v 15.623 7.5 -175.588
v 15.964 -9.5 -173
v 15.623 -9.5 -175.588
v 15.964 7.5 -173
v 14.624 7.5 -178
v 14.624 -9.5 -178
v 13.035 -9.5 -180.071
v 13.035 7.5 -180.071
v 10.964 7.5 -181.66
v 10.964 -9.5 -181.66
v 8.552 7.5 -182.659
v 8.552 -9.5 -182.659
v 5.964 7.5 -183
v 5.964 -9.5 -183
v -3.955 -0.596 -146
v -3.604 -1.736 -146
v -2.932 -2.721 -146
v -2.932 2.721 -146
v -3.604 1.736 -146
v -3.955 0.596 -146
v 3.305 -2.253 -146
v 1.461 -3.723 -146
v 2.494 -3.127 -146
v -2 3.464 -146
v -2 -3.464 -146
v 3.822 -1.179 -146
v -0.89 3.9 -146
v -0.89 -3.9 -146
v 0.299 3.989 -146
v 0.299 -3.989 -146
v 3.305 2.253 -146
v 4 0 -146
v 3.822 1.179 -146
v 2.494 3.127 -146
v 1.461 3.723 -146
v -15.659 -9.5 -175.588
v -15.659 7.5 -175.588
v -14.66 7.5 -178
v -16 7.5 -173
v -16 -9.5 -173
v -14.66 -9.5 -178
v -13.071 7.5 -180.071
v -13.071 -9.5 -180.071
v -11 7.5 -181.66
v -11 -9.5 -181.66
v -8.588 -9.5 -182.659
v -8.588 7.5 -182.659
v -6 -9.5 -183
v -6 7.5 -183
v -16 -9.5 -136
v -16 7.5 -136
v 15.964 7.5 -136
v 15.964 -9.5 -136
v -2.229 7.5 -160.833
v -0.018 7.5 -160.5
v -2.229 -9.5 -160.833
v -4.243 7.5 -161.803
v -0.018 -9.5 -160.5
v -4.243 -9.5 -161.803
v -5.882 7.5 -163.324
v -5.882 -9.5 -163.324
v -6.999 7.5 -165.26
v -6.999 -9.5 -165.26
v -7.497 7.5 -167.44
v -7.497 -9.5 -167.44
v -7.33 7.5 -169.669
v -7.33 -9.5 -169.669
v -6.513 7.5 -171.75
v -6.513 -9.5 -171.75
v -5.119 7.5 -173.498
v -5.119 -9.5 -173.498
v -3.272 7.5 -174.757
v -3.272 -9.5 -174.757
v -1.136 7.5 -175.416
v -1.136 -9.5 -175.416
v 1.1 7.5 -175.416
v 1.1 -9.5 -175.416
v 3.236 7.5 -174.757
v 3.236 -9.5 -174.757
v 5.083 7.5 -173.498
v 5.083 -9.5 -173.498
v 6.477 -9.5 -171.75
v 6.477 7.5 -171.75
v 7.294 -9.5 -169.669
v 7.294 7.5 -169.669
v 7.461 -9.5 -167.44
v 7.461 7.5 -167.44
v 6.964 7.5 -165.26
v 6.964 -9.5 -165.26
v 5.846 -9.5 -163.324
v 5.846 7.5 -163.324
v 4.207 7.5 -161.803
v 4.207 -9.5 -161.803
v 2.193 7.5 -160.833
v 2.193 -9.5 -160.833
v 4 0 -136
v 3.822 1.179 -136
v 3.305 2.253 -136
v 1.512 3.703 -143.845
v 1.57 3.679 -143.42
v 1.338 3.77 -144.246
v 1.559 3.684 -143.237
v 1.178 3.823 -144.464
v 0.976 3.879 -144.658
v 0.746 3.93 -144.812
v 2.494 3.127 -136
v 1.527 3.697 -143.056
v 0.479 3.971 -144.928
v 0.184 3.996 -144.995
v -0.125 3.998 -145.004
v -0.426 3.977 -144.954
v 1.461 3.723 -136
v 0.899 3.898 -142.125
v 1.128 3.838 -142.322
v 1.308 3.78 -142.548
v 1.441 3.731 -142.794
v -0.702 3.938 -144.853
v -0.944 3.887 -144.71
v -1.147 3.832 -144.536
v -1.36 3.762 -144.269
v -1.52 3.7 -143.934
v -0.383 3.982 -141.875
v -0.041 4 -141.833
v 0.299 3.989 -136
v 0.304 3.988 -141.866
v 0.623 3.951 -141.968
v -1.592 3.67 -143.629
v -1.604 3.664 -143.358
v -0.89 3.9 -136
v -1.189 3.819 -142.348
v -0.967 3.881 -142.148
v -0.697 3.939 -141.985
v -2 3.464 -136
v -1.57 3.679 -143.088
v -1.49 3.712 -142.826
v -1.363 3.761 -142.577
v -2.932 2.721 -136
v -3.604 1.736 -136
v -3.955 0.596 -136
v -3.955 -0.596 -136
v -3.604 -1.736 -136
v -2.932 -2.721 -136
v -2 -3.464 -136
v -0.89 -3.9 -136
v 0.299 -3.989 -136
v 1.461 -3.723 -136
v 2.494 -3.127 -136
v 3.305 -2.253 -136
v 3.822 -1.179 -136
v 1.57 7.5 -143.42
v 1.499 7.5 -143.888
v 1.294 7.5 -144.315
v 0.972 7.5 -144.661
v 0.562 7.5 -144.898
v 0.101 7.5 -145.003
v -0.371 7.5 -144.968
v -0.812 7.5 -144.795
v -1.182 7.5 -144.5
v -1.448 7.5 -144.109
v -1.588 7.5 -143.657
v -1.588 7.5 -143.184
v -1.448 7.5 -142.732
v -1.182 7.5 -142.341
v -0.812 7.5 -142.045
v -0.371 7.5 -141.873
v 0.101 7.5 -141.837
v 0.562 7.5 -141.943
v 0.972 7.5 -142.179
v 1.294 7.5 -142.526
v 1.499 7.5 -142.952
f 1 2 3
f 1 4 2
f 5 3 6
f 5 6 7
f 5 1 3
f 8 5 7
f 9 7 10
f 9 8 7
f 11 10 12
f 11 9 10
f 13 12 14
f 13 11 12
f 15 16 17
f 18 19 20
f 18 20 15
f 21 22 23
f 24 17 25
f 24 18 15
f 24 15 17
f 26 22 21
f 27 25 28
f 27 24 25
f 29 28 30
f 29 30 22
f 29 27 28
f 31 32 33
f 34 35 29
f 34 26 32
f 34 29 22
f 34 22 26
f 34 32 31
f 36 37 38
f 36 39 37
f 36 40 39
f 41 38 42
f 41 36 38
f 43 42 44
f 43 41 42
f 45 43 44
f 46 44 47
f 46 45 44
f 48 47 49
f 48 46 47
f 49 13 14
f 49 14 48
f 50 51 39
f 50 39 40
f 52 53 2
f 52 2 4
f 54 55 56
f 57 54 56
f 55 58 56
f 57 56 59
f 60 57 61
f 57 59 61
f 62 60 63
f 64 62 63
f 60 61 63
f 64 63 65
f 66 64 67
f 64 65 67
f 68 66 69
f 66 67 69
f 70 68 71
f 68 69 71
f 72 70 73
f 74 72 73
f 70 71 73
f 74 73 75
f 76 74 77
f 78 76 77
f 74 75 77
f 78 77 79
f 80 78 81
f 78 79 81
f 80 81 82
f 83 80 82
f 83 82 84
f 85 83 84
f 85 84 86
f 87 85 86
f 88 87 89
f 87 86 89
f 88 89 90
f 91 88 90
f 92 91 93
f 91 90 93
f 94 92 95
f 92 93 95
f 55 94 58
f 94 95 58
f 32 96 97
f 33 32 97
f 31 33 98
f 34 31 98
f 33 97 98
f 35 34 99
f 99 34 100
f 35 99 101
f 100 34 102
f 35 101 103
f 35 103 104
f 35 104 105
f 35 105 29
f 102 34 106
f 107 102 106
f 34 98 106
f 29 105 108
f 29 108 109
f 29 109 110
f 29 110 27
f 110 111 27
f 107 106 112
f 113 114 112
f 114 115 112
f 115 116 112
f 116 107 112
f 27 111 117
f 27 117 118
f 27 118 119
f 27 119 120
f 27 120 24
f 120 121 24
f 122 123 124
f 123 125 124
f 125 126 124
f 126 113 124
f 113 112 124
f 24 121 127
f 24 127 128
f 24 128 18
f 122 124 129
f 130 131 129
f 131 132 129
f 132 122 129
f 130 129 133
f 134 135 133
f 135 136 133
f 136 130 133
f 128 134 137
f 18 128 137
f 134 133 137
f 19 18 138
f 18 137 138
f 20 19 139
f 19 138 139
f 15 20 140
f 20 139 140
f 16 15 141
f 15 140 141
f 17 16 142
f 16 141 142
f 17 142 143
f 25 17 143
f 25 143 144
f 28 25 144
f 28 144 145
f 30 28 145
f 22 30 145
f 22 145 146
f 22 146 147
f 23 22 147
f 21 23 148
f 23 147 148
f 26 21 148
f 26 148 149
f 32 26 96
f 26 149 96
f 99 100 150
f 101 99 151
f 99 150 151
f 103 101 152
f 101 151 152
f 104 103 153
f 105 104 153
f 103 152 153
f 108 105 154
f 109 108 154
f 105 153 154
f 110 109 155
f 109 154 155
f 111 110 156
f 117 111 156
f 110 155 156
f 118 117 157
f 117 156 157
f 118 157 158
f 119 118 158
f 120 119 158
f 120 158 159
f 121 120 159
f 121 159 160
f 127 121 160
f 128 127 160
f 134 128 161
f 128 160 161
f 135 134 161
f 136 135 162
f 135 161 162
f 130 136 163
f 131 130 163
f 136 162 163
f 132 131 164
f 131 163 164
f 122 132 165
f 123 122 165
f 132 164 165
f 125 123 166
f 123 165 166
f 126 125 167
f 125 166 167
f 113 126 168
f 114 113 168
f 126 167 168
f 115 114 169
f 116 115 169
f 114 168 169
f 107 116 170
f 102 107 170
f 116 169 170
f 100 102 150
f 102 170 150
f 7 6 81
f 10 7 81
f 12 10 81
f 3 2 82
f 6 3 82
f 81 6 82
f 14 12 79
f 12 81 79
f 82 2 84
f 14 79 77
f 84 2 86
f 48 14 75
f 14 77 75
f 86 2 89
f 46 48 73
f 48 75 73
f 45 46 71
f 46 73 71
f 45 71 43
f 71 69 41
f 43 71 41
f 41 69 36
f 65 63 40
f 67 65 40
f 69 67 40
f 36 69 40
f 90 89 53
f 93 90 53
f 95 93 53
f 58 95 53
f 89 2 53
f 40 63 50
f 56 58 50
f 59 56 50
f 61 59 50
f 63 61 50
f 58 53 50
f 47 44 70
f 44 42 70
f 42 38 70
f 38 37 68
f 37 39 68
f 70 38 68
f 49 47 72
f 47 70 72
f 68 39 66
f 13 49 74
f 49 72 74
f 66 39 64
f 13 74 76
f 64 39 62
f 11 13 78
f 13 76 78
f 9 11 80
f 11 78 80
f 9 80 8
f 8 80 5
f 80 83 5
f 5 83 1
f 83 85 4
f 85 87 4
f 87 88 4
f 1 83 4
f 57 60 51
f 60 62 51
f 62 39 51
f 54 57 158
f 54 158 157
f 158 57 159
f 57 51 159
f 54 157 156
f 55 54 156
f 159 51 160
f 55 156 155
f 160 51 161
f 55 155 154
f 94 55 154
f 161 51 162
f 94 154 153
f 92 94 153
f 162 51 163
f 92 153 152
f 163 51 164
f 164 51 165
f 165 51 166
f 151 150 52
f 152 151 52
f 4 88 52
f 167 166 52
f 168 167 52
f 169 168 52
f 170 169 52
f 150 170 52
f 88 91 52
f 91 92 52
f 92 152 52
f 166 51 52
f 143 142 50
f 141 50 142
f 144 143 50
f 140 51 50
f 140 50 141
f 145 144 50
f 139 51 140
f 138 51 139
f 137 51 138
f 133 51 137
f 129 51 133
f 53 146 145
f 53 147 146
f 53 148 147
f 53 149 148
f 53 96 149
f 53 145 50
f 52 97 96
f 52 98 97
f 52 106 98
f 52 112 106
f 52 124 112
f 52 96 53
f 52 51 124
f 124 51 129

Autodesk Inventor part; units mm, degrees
ref_plane "YZ Plane" through (0, 0, 0) normal (1, 0, 0) x (0, 1, 0)
ref_plane "XZ Plane" through (0, 0, 0) normal (0, 1, 0) x (-1, 0, 0)
ref_plane "XY Plane" through (0, 0, 0) normal (0, 0, 1) x (1, 0, 0)
sketch "Sketch1" plane through (0, 0, 0) normal (0, 0, 1) x (1, 0, 0)
  circle A0 centre (0, 0) radius 7.5
  line L0 (-16, 7.5) -> (16, 7.5)
  line L1 (16, 7.5) -> (16, -9.5)
  line L2 (16, -9.5) -> (-16, -9.5)
  line L3 (-16, -9.5) -> (-16, 7.5)
  line L4 (-7.5, 0) -> (-7.5, 7.5)
  line L5 (7.5, 0) -> (7.5, 7.5)
  point P0 (0, -9.5)
  dimension "d0" = 15
  dimension "d5" = 32
  dimension "d6" = 2
extrude "Extrusion1" add sketch "Sketch1" along normal blind 24.2 contours A0 L5 L0 L1 L2 L3 L4
sketch "Sketch2" plane through (0, 0, 24.2) normal (0, 0, 1) x (1, 0, 0)
  line L0 (-16, -9.5) -> (16, -9.5) projected
  line L1 (16, -9.5) -> (16, 7.5) projected
  line L2 (16, 7.5) -> (7.5, 7.5) projected
  line L3 (7.5, 7.5) -> (7.5, 0) projected
  arc A0 (-7.5, 0) -> (7.5, 0) centre (0, 0) ccw projected
  line L4 (-7.5, 0) -> (-7.5, 7.5) projected
  line L5 (-7.5, 7.5) -> (-16, 7.5) projected
  line L6 (-16, 7.5) -> (-16, -9.5) projected
  circle A1 centre (0, 0) radius 4.25
  line L7 (-7.5, 7.5) -> (-16, 7.5) projected
  line L8 (-7.5, 7.5) -> (7.5, 7.5)
  dimension "d10" = 8.5
extrude "Extrusion3" add sketch "Sketch2" along normal blind 3
sketch "Sketch4" plane through (0, 0, 0) normal (0, 0, -1) x (-1, 0, 0)
  line L0 (-16, 7.5) -> (-7.5, 7.5) projected
  line L1 (-16, -9.5) -> (-16, 7.5) projected
  line L2 (16, -9.5) -> (-16, -9.5) projected
  line L3 (16, 7.5) -> (16, -9.5) projected
  line L4 (7.5, 7.5) -> (16, 7.5) projected
  line L5 (-7.5, 7.5) -> (7.5, 7.5) projected
  circle A0 centre (0, 0) radius 4.25 projected
extrude "Extrusion4" add sketch "Sketch4" along normal blind 3
sketch "Sketch5" plane through (0, 0, -3) normal (0, 0, -1) x (-1, 0, 0)
  line L0 (16, 7.5) -> (-16, 7.5) projected
  line L1 (16, -9.5) -> (16, 7.5) projected
  line L2 (-16, -9.5) -> (16, -9.5) projected
  line L3 (-16, 7.5) -> (-16, -9.5) projected
  circle A0 centre (0, 0) radius 7.5
  arc A1 (-7.5, 0) -> (7.5, 0) centre (0, 0) ccw projected
  line L4 (7.5, 0) -> (7.5, 7.5)
  line L5 (-16, 7.5) -> (16, 7.5) projected
  line L6 (-7.5, 7.5) -> (-7.5, 0) projected
  line L7 (-7.5, 0) -> (-7.5, 7.5)
extrude "Extrusion5" add sketch "Sketch5" along normal blind 130 contours L1 L2 L3 L0 L6 A0 L4
sketch "Sketch6" plane through (0, 0, -133) normal (0, 0, -1) x (-1, 0, 0)
  line L0 (0, 0) -> (0, -9.5) construction
  line L1 (16, -9.5) -> (-16, -9.5) construction
  line L2 (-16, 7.5) -> (-16, -9.5) construction
  point P0 (-12.5, -6)
  point P1 (12.5, -6)
  dimension "d17" = 3.5
  dimension "d18" = 3.5
hole "Hole1" at (12.5, -6, -133) at (-12.5, -6, -133) direction (0, 0, 1) diameter 2.3813 depth 10 tip angle 118
sketch "Sketch7" plane through (-16, 7.5, 27.2) normal (0, 1, 0) x (1, 0, 0)
  line L0 (16, 0) -> (16, 160.2) construction
  line L1 (32, 160.2) -> (0, 160.2) projected
  line L2 (0, 160.2) -> (0, 0) projected
  line L3 (32, 0) -> (0, 0) projected
  point P0 (16, 27.2)
  point P1 (3.5, 3.5)
  point P2 (3.5, 33.5)
  point P3 (3.5, 63.5)
  point P4 (3.5, 93.5)
  point P5 (3.5, 123.5)
  point P6 (3.5, 145.2)
  point P7 (28.5, 3.5)
  point P8 (28.5, 33.5)
  point P9 (28.5, 63.5)
  point P10 (28.5, 93.5)
  point P11 (28.5, 123.5)
  point P12 (28.5, 145.2)
  dimension "d27" = 3.5
  dimension "d44" = 30
  dimension "d49" = 3.5
  dimension "d50" = 15
hole "Hole3" at (-12.5, 7.5, 23.7) at (-12.5, 7.5, -6.3) at (-12.5, 7.5, -36.3) at (-12.5, 7.5, -66.3) at (-12.5, 7.5, -96.3) at (-12.5, 7.5, -118) at (12.5, 7.5, 23.7) at (12.5, 7.5, -6.3) at (12.5, 7.5, -36.3) at (12.5, 7.5, -66.3) at (12.5, 7.5, -96.3) at (12.5, 7.5, -118) direction (0, -1, 0) diameter 3.175 end through all
sketch "Sketch8" plane through (-16, -9.5, 27.2) normal (0, -1, 0) x (1, 0, 0)
  circle A0 centre (28.5, -3.5) radius 1.5875 projected
  line L0 (30.2321, -6.5) -> (26.7679, -6.5)
  line L1 (26.7679, -6.5) -> (25.0359, -3.5)
  line L2 (25.0359, -3.5) -> (26.7679, -0.5)
  line L3 (26.7679, -0.5) -> (30.2321, -0.5)
  line L4 (30.2321, -0.5) -> (31.9641, -3.5)
  line L5 (31.9641, -3.5) -> (30.2321, -6.5)
  line L6 (5.2321, -6.5) -> (1.7679, -6.5)
  line L7 (1.7679, -0.5) -> (5.2321, -0.5)
  line L8 (5.2321, -0.5) -> (6.9641, -3.5)
  line L9 (6.9641, -3.5) -> (5.2321, -6.5)
  line L10 (1.7679, -6.5) -> (0.0359, -3.5)
  line L11 (0.0359, -3.5) -> (1.7679, -0.5)
  line L12 (0, 0) -> (0, -160.2) projected
  line L13 (1.7679, -36.5) -> (0.0359, -33.5)
  line L14 (0.0359, -33.5) -> (1.7679, -30.5)
  line L15 (1.7679, -30.5) -> (5.2321, -30.5)
  line L16 (5.2321, -30.5) -> (6.9641, -33.5)
  line L17 (6.9641, -33.5) -> (5.2321, -36.5)
  line L18 (25.0359, -33.5) -> (26.7679, -30.5)
  line L19 (26.7679, -36.5) -> (25.0359, -33.5)
  line L20 (30.2321, -36.5) -> (26.7679, -36.5)
  line L21 (31.9641, -33.5) -> (30.2321, -36.5)
  line L22 (30.2321, -30.5) -> (31.9641, -33.5)
  line L23 (26.7679, -30.5) -> (30.2321, -30.5)
  line L24 (1.7679, -66.5) -> (0.0359, -63.5)
  line L25 (0.0359, -63.5) -> (1.7679, -60.5)
  line L26 (1.7679, -60.5) -> (5.2321, -60.5)
  line L27 (5.2321, -60.5) -> (6.9641, -63.5)
  line L28 (6.9641, -63.5) -> (5.2321, -66.5)
  line L29 (25.0359, -63.5) -> (26.7679, -60.5)
  line L30 (26.7679, -66.5) -> (25.0359, -63.5)
  line L31 (30.2321, -66.5) -> (26.7679, -66.5)
  line L32 (31.9641, -63.5) -> (30.2321, -66.5)
  line L33 (30.2321, -60.5) -> (31.9641, -63.5)
  line L34 (26.7679, -60.5) -> (30.2321, -60.5)
  line L35 (1.7679, -96.5) -> (0.0359, -93.5)
  line L36 (0.0359, -93.5) -> (1.7679, -90.5)
  line L37 (1.7679, -90.5) -> (5.2321, -90.5)
  line L38 (5.2321, -90.5) -> (6.9641, -93.5)
  line L39 (6.9641, -93.5) -> (5.2321, -96.5)
  line L40 (25.0359, -93.5) -> (26.7679, -90.5)
  line L41 (26.7679, -96.5) -> (25.0359, -93.5)
  line L42 (30.2321, -96.5) -> (26.7679, -96.5)
  line L43 (31.9641, -93.5) -> (30.2321, -96.5)
  line L44 (30.2321, -90.5) -> (31.9641, -93.5)
  line L45 (26.7679, -90.5) -> (30.2321, -90.5)
  line L46 (1.7679, -126.5) -> (0.0359, -123.5)
  line L47 (0.0359, -123.5) -> (1.7679, -120.5)
  line L48 (1.7679, -120.5) -> (5.2321, -120.5)
  line L49 (5.2321, -120.5) -> (6.9641, -123.5)
  line L50 (6.9641, -123.5) -> (5.2321, -126.5)
  line L51 (25.0359, -123.5) -> (26.7679, -120.5)
  line L52 (26.7679, -126.5) -> (25.0359, -123.5)
  line L53 (30.2321, -126.5) -> (26.7679, -126.5)
  line L54 (31.9641, -123.5) -> (30.2321, -126.5)
  line L55 (30.2321, -120.5) -> (31.9641, -123.5)
  line L56 (26.7679, -120.5) -> (30.2321, -120.5)
  line L57 (5.2321, -36.5) -> (1.7679, -36.5)
  line L58 (5.2321, -66.5) -> (1.7679, -66.5)
  line L59 (5.2321, -96.5) -> (1.7679, -96.5)
  line L60 (5.2321, -126.5) -> (1.7679, -126.5)
  line L61 (30.2321, -148) -> (26.7679, -148)
  line L62 (31.9641, -145) -> (30.2321, -148)
  line L63 (30.2321, -142) -> (31.9641, -145)
  line L64 (26.7679, -142) -> (30.2321, -142)
  line L65 (25.0359, -145) -> (26.7679, -142)
  line L66 (26.7679, -148) -> (25.0359, -145)
  line L67 (5.2321, -142) -> (6.9641, -145)
  line L68 (6.9641, -145) -> (5.2321, -148)
  line L69 (5.2321, -148) -> (1.7679, -148)
  line L70 (1.7679, -148) -> (0.0359, -145)
  line L71 (0.0359, -145) -> (1.7679, -142)
  line L72 (1.7679, -142) -> (5.2321, -142)
  point P0 (16, -27.2)
  point P1 (1.7679, -126.5)
  point P2 (5.2321, -126.5)
  dimension "d58" = 6
  dimension "d61" = 25
  dimension "d68" = 30
  dimension "d75" = 30
  dimension "d82" = 21.5
extrude "Extrusion6" cut sketch "Sketch8" against normal blind 4 contours A0 | L0 L1 L2 L3 L4 L5 | L6 L10 L11 L7 L8 L9 | L13 L14 L15 L16 L17 L57 | L18 L23 L22 L21 L20 L19 | L24 L25 L26 L27 L28 L58 | L29 L34 L33 L32 L31 L30 | L35 L36 L37 L38 L39 L59 | L40 L45 L44 L43 L42 L41 | L46 L47 L48 L49 L50 L60 | L51 L56 L55 L54 L53 L52 | L61 L66 L65 L64 L63 L62 | L67 L68 L69 L70 L71 L72
sketch "Sketch9" plane through (0, 0, -133) normal (0, 0, -1) x (-1, 0, 0)
  line L0 (-15.9641, -9.5) -> (-15.9641, -5.5) projected
  line L1 (16, 7.5) -> (16, -9.5) projected
  line L2 (-15.9641, -9.5) -> (16, -9.5)
  line L3 (16, -9.5) -> (16, 7.5)
  line L4 (16, 7.5) -> (-15.9641, 7.5)
  line L5 (-15.9641, 7.5) -> (-15.9641, -9.5)
  point P0 (0, 0)
extrude "Extrusion7" add sketch "Sketch9" along normal blind 50
fillet "Fillet1" radius 10 2 edges at (15.9641, -1, -183) (-16, -1, -183)
sketch "Sketch10" plane through (-16, 7.5, 27.2) normal (0, 1, 0) x (1, 0, 0)
  line L0 (10, 210.2) -> (21.9641, 210.2) projected
  point P0 (16, 27.2)
  point P1 (15.9821, 195.2)
  point P2 (15.9821, 210.2)
  point P3 (15.9821, 210.2)
  dimension "d94" = 15
hole "Hole4" at (-0.0179, 7.5, -168) direction (0, -1, 0) diameter 15 end through all
sketch "Sketch11" plane through (-16, 7.5, 27.2) normal (0, 1, 0) x (1, 0, 0)
  line L0 (28.5, 160.2) -> (3.5, 160.2)
  line L1 (3.5, 160.2) -> (3.5, 163.2)
  line L2 (3.5, 163.2) -> (28.5, 163.2)
  line L3 (28.5, 163.2) -> (28.5, 160.2)
  line L4 (8.5, 160.2) -> (23.5, 160.2) projected
  point P0 (16, 27.2)
  point P1 (3.5, 161.7)
  point P2 (16, 160.2)
  dimension "d102" = 25
  dimension "d103" = 3
extrude "Extrusion8" cut sketch "Sketch11" against normal blind 15
sketch "Sketch12" plane through (-12.5, 7.5, -136) normal (0, 0, 1) x (1, 0, 0)
  line L0 (-20.042, -34.0875) -> (45.042, -34.0875)
  line L1 (45.042, -34.0875) -> (45.042, 19.0875)
  line L2 (45.042, 19.0875) -> (-20.042, 19.0875)
  line L3 (-20.042, 19.0875) -> (-20.042, -34.0875)
  line L4 (-20.042, -34.0875) -> (45.042, 19.0875) construction
  line L5 (45.042, -34.0875) -> (-20.042, 19.0875) construction
  point P0 (12.5, -7.5)
extrude "Extrusion9" cut sketch "Sketch12" along normal through all
sketch "Sketch13" plane through (-16, 7.5, -136) normal (0, 0, 1) x (1, 0, 0)
  circle A0 centre (16, -7.5) radius 4
  dimension "d108" = 8
extrude "Extrusion10" cut sketch "Sketch13" against normal blind 10
sketch "Sketch14" plane through (-6, 7.5, -183) normal (0, 1, 0) x (1, 0, 0)
  circle A0 centre (5.9821, -39.5797) radius 1.5875
  point P0 (6, -183)
  dimension "d111" = 3.175
extrude "Extrusion11" cut sketch "Sketch14" against normal blind 10
properties part number "sujecion_v3"
